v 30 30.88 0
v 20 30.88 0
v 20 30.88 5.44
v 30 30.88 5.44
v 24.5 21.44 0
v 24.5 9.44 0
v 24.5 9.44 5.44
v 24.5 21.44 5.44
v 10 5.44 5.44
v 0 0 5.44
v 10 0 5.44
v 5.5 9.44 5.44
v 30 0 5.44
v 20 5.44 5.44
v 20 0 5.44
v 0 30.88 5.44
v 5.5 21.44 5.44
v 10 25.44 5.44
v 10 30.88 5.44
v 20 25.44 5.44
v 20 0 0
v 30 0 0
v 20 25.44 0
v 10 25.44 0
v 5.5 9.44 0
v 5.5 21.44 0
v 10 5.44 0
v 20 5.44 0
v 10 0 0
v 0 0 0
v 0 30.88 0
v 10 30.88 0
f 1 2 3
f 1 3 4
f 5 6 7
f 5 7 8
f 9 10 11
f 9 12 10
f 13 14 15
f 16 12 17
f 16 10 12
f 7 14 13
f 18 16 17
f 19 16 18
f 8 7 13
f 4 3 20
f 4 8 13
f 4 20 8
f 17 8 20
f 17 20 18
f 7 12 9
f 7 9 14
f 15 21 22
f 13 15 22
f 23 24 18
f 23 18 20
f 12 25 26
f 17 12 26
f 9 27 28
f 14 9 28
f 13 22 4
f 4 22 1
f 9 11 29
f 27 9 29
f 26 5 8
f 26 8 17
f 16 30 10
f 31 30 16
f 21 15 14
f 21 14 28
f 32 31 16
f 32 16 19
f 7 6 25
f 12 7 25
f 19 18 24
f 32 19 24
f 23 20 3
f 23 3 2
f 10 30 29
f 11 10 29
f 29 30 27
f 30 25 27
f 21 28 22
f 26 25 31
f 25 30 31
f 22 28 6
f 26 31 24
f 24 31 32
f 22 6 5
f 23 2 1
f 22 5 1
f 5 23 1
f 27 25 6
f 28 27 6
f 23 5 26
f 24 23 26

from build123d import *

# Parameters (mm, degrees)
SKETCH1_W           = 30
SKETCH1_H           = 30.88
BOSS_EXTRUDE1_DEPTH = 5.44
SKETCH2_W           = 19
SKETCH2_H           = 12
CUT_EXTRUDE1_DEPTH  = 44.395483636
CAVITY1_OUTLINE_W   = 10
CAVITY1_OUTLINE_H   = 5.44
CAVITY1_DEPTH       = 5.44
CAVITY1_START       = 25.44
CAVITY1_2_OUTLINE_W = 10
CAVITY1_2_OUTLINE_H = 5.44
CAVITY1_2_DEPTH     = 5.44


# Read off the part's stored shape, not the designer's step: Cavity1
with BuildPart() as part:
    # Sketch1 → Boss-Extrude1 (new body)
    with BuildSketch(Plane.XY):
        with Locations((15, 15.44)):
            Rectangle(SKETCH1_W, SKETCH1_H)
    extrude(amount=BOSS_EXTRUDE1_DEPTH)

    # Sketch2 → Cut-Extrude1 (cut, through all)
    with BuildSketch(Plane(origin=(0, 0, 0), x_dir=(-1, 0, 0), z_dir=(0, 0, -1))):
        with Locations((-15, 15.44)):
            Rectangle(SKETCH2_W, SKETCH2_H)
    extrude(amount=-CUT_EXTRUDE1_DEPTH, mode=Mode.SUBTRACT)

    # Cavity1 outline → Cavity1 (cut)
    with BuildSketch(Plane(origin=(0, 0, 0), x_dir=(1, 0, 0), z_dir=(0, 1, 0))):
        with Locations((15, -2.72)):
            Rectangle(CAVITY1_OUTLINE_W, CAVITY1_OUTLINE_H)
    extrude(amount=CAVITY1_DEPTH, mode=Mode.SUBTRACT)

    # Cavity1 2 outline → Cavity1 2 (cut)
    with BuildSketch(Plane(origin=(0, 0, 0), x_dir=(1, 0, 0), z_dir=(0, 1, 0)).offset(CAVITY1_START)):
        with Locations((15, -2.72)):
            Rectangle(CAVITY1_2_OUTLINE_W, CAVITY1_2_OUTLINE_H)
    extrude(amount=CAVITY1_2_DEPTH, mode=Mode.SUBTRACT)


solid = part.part
